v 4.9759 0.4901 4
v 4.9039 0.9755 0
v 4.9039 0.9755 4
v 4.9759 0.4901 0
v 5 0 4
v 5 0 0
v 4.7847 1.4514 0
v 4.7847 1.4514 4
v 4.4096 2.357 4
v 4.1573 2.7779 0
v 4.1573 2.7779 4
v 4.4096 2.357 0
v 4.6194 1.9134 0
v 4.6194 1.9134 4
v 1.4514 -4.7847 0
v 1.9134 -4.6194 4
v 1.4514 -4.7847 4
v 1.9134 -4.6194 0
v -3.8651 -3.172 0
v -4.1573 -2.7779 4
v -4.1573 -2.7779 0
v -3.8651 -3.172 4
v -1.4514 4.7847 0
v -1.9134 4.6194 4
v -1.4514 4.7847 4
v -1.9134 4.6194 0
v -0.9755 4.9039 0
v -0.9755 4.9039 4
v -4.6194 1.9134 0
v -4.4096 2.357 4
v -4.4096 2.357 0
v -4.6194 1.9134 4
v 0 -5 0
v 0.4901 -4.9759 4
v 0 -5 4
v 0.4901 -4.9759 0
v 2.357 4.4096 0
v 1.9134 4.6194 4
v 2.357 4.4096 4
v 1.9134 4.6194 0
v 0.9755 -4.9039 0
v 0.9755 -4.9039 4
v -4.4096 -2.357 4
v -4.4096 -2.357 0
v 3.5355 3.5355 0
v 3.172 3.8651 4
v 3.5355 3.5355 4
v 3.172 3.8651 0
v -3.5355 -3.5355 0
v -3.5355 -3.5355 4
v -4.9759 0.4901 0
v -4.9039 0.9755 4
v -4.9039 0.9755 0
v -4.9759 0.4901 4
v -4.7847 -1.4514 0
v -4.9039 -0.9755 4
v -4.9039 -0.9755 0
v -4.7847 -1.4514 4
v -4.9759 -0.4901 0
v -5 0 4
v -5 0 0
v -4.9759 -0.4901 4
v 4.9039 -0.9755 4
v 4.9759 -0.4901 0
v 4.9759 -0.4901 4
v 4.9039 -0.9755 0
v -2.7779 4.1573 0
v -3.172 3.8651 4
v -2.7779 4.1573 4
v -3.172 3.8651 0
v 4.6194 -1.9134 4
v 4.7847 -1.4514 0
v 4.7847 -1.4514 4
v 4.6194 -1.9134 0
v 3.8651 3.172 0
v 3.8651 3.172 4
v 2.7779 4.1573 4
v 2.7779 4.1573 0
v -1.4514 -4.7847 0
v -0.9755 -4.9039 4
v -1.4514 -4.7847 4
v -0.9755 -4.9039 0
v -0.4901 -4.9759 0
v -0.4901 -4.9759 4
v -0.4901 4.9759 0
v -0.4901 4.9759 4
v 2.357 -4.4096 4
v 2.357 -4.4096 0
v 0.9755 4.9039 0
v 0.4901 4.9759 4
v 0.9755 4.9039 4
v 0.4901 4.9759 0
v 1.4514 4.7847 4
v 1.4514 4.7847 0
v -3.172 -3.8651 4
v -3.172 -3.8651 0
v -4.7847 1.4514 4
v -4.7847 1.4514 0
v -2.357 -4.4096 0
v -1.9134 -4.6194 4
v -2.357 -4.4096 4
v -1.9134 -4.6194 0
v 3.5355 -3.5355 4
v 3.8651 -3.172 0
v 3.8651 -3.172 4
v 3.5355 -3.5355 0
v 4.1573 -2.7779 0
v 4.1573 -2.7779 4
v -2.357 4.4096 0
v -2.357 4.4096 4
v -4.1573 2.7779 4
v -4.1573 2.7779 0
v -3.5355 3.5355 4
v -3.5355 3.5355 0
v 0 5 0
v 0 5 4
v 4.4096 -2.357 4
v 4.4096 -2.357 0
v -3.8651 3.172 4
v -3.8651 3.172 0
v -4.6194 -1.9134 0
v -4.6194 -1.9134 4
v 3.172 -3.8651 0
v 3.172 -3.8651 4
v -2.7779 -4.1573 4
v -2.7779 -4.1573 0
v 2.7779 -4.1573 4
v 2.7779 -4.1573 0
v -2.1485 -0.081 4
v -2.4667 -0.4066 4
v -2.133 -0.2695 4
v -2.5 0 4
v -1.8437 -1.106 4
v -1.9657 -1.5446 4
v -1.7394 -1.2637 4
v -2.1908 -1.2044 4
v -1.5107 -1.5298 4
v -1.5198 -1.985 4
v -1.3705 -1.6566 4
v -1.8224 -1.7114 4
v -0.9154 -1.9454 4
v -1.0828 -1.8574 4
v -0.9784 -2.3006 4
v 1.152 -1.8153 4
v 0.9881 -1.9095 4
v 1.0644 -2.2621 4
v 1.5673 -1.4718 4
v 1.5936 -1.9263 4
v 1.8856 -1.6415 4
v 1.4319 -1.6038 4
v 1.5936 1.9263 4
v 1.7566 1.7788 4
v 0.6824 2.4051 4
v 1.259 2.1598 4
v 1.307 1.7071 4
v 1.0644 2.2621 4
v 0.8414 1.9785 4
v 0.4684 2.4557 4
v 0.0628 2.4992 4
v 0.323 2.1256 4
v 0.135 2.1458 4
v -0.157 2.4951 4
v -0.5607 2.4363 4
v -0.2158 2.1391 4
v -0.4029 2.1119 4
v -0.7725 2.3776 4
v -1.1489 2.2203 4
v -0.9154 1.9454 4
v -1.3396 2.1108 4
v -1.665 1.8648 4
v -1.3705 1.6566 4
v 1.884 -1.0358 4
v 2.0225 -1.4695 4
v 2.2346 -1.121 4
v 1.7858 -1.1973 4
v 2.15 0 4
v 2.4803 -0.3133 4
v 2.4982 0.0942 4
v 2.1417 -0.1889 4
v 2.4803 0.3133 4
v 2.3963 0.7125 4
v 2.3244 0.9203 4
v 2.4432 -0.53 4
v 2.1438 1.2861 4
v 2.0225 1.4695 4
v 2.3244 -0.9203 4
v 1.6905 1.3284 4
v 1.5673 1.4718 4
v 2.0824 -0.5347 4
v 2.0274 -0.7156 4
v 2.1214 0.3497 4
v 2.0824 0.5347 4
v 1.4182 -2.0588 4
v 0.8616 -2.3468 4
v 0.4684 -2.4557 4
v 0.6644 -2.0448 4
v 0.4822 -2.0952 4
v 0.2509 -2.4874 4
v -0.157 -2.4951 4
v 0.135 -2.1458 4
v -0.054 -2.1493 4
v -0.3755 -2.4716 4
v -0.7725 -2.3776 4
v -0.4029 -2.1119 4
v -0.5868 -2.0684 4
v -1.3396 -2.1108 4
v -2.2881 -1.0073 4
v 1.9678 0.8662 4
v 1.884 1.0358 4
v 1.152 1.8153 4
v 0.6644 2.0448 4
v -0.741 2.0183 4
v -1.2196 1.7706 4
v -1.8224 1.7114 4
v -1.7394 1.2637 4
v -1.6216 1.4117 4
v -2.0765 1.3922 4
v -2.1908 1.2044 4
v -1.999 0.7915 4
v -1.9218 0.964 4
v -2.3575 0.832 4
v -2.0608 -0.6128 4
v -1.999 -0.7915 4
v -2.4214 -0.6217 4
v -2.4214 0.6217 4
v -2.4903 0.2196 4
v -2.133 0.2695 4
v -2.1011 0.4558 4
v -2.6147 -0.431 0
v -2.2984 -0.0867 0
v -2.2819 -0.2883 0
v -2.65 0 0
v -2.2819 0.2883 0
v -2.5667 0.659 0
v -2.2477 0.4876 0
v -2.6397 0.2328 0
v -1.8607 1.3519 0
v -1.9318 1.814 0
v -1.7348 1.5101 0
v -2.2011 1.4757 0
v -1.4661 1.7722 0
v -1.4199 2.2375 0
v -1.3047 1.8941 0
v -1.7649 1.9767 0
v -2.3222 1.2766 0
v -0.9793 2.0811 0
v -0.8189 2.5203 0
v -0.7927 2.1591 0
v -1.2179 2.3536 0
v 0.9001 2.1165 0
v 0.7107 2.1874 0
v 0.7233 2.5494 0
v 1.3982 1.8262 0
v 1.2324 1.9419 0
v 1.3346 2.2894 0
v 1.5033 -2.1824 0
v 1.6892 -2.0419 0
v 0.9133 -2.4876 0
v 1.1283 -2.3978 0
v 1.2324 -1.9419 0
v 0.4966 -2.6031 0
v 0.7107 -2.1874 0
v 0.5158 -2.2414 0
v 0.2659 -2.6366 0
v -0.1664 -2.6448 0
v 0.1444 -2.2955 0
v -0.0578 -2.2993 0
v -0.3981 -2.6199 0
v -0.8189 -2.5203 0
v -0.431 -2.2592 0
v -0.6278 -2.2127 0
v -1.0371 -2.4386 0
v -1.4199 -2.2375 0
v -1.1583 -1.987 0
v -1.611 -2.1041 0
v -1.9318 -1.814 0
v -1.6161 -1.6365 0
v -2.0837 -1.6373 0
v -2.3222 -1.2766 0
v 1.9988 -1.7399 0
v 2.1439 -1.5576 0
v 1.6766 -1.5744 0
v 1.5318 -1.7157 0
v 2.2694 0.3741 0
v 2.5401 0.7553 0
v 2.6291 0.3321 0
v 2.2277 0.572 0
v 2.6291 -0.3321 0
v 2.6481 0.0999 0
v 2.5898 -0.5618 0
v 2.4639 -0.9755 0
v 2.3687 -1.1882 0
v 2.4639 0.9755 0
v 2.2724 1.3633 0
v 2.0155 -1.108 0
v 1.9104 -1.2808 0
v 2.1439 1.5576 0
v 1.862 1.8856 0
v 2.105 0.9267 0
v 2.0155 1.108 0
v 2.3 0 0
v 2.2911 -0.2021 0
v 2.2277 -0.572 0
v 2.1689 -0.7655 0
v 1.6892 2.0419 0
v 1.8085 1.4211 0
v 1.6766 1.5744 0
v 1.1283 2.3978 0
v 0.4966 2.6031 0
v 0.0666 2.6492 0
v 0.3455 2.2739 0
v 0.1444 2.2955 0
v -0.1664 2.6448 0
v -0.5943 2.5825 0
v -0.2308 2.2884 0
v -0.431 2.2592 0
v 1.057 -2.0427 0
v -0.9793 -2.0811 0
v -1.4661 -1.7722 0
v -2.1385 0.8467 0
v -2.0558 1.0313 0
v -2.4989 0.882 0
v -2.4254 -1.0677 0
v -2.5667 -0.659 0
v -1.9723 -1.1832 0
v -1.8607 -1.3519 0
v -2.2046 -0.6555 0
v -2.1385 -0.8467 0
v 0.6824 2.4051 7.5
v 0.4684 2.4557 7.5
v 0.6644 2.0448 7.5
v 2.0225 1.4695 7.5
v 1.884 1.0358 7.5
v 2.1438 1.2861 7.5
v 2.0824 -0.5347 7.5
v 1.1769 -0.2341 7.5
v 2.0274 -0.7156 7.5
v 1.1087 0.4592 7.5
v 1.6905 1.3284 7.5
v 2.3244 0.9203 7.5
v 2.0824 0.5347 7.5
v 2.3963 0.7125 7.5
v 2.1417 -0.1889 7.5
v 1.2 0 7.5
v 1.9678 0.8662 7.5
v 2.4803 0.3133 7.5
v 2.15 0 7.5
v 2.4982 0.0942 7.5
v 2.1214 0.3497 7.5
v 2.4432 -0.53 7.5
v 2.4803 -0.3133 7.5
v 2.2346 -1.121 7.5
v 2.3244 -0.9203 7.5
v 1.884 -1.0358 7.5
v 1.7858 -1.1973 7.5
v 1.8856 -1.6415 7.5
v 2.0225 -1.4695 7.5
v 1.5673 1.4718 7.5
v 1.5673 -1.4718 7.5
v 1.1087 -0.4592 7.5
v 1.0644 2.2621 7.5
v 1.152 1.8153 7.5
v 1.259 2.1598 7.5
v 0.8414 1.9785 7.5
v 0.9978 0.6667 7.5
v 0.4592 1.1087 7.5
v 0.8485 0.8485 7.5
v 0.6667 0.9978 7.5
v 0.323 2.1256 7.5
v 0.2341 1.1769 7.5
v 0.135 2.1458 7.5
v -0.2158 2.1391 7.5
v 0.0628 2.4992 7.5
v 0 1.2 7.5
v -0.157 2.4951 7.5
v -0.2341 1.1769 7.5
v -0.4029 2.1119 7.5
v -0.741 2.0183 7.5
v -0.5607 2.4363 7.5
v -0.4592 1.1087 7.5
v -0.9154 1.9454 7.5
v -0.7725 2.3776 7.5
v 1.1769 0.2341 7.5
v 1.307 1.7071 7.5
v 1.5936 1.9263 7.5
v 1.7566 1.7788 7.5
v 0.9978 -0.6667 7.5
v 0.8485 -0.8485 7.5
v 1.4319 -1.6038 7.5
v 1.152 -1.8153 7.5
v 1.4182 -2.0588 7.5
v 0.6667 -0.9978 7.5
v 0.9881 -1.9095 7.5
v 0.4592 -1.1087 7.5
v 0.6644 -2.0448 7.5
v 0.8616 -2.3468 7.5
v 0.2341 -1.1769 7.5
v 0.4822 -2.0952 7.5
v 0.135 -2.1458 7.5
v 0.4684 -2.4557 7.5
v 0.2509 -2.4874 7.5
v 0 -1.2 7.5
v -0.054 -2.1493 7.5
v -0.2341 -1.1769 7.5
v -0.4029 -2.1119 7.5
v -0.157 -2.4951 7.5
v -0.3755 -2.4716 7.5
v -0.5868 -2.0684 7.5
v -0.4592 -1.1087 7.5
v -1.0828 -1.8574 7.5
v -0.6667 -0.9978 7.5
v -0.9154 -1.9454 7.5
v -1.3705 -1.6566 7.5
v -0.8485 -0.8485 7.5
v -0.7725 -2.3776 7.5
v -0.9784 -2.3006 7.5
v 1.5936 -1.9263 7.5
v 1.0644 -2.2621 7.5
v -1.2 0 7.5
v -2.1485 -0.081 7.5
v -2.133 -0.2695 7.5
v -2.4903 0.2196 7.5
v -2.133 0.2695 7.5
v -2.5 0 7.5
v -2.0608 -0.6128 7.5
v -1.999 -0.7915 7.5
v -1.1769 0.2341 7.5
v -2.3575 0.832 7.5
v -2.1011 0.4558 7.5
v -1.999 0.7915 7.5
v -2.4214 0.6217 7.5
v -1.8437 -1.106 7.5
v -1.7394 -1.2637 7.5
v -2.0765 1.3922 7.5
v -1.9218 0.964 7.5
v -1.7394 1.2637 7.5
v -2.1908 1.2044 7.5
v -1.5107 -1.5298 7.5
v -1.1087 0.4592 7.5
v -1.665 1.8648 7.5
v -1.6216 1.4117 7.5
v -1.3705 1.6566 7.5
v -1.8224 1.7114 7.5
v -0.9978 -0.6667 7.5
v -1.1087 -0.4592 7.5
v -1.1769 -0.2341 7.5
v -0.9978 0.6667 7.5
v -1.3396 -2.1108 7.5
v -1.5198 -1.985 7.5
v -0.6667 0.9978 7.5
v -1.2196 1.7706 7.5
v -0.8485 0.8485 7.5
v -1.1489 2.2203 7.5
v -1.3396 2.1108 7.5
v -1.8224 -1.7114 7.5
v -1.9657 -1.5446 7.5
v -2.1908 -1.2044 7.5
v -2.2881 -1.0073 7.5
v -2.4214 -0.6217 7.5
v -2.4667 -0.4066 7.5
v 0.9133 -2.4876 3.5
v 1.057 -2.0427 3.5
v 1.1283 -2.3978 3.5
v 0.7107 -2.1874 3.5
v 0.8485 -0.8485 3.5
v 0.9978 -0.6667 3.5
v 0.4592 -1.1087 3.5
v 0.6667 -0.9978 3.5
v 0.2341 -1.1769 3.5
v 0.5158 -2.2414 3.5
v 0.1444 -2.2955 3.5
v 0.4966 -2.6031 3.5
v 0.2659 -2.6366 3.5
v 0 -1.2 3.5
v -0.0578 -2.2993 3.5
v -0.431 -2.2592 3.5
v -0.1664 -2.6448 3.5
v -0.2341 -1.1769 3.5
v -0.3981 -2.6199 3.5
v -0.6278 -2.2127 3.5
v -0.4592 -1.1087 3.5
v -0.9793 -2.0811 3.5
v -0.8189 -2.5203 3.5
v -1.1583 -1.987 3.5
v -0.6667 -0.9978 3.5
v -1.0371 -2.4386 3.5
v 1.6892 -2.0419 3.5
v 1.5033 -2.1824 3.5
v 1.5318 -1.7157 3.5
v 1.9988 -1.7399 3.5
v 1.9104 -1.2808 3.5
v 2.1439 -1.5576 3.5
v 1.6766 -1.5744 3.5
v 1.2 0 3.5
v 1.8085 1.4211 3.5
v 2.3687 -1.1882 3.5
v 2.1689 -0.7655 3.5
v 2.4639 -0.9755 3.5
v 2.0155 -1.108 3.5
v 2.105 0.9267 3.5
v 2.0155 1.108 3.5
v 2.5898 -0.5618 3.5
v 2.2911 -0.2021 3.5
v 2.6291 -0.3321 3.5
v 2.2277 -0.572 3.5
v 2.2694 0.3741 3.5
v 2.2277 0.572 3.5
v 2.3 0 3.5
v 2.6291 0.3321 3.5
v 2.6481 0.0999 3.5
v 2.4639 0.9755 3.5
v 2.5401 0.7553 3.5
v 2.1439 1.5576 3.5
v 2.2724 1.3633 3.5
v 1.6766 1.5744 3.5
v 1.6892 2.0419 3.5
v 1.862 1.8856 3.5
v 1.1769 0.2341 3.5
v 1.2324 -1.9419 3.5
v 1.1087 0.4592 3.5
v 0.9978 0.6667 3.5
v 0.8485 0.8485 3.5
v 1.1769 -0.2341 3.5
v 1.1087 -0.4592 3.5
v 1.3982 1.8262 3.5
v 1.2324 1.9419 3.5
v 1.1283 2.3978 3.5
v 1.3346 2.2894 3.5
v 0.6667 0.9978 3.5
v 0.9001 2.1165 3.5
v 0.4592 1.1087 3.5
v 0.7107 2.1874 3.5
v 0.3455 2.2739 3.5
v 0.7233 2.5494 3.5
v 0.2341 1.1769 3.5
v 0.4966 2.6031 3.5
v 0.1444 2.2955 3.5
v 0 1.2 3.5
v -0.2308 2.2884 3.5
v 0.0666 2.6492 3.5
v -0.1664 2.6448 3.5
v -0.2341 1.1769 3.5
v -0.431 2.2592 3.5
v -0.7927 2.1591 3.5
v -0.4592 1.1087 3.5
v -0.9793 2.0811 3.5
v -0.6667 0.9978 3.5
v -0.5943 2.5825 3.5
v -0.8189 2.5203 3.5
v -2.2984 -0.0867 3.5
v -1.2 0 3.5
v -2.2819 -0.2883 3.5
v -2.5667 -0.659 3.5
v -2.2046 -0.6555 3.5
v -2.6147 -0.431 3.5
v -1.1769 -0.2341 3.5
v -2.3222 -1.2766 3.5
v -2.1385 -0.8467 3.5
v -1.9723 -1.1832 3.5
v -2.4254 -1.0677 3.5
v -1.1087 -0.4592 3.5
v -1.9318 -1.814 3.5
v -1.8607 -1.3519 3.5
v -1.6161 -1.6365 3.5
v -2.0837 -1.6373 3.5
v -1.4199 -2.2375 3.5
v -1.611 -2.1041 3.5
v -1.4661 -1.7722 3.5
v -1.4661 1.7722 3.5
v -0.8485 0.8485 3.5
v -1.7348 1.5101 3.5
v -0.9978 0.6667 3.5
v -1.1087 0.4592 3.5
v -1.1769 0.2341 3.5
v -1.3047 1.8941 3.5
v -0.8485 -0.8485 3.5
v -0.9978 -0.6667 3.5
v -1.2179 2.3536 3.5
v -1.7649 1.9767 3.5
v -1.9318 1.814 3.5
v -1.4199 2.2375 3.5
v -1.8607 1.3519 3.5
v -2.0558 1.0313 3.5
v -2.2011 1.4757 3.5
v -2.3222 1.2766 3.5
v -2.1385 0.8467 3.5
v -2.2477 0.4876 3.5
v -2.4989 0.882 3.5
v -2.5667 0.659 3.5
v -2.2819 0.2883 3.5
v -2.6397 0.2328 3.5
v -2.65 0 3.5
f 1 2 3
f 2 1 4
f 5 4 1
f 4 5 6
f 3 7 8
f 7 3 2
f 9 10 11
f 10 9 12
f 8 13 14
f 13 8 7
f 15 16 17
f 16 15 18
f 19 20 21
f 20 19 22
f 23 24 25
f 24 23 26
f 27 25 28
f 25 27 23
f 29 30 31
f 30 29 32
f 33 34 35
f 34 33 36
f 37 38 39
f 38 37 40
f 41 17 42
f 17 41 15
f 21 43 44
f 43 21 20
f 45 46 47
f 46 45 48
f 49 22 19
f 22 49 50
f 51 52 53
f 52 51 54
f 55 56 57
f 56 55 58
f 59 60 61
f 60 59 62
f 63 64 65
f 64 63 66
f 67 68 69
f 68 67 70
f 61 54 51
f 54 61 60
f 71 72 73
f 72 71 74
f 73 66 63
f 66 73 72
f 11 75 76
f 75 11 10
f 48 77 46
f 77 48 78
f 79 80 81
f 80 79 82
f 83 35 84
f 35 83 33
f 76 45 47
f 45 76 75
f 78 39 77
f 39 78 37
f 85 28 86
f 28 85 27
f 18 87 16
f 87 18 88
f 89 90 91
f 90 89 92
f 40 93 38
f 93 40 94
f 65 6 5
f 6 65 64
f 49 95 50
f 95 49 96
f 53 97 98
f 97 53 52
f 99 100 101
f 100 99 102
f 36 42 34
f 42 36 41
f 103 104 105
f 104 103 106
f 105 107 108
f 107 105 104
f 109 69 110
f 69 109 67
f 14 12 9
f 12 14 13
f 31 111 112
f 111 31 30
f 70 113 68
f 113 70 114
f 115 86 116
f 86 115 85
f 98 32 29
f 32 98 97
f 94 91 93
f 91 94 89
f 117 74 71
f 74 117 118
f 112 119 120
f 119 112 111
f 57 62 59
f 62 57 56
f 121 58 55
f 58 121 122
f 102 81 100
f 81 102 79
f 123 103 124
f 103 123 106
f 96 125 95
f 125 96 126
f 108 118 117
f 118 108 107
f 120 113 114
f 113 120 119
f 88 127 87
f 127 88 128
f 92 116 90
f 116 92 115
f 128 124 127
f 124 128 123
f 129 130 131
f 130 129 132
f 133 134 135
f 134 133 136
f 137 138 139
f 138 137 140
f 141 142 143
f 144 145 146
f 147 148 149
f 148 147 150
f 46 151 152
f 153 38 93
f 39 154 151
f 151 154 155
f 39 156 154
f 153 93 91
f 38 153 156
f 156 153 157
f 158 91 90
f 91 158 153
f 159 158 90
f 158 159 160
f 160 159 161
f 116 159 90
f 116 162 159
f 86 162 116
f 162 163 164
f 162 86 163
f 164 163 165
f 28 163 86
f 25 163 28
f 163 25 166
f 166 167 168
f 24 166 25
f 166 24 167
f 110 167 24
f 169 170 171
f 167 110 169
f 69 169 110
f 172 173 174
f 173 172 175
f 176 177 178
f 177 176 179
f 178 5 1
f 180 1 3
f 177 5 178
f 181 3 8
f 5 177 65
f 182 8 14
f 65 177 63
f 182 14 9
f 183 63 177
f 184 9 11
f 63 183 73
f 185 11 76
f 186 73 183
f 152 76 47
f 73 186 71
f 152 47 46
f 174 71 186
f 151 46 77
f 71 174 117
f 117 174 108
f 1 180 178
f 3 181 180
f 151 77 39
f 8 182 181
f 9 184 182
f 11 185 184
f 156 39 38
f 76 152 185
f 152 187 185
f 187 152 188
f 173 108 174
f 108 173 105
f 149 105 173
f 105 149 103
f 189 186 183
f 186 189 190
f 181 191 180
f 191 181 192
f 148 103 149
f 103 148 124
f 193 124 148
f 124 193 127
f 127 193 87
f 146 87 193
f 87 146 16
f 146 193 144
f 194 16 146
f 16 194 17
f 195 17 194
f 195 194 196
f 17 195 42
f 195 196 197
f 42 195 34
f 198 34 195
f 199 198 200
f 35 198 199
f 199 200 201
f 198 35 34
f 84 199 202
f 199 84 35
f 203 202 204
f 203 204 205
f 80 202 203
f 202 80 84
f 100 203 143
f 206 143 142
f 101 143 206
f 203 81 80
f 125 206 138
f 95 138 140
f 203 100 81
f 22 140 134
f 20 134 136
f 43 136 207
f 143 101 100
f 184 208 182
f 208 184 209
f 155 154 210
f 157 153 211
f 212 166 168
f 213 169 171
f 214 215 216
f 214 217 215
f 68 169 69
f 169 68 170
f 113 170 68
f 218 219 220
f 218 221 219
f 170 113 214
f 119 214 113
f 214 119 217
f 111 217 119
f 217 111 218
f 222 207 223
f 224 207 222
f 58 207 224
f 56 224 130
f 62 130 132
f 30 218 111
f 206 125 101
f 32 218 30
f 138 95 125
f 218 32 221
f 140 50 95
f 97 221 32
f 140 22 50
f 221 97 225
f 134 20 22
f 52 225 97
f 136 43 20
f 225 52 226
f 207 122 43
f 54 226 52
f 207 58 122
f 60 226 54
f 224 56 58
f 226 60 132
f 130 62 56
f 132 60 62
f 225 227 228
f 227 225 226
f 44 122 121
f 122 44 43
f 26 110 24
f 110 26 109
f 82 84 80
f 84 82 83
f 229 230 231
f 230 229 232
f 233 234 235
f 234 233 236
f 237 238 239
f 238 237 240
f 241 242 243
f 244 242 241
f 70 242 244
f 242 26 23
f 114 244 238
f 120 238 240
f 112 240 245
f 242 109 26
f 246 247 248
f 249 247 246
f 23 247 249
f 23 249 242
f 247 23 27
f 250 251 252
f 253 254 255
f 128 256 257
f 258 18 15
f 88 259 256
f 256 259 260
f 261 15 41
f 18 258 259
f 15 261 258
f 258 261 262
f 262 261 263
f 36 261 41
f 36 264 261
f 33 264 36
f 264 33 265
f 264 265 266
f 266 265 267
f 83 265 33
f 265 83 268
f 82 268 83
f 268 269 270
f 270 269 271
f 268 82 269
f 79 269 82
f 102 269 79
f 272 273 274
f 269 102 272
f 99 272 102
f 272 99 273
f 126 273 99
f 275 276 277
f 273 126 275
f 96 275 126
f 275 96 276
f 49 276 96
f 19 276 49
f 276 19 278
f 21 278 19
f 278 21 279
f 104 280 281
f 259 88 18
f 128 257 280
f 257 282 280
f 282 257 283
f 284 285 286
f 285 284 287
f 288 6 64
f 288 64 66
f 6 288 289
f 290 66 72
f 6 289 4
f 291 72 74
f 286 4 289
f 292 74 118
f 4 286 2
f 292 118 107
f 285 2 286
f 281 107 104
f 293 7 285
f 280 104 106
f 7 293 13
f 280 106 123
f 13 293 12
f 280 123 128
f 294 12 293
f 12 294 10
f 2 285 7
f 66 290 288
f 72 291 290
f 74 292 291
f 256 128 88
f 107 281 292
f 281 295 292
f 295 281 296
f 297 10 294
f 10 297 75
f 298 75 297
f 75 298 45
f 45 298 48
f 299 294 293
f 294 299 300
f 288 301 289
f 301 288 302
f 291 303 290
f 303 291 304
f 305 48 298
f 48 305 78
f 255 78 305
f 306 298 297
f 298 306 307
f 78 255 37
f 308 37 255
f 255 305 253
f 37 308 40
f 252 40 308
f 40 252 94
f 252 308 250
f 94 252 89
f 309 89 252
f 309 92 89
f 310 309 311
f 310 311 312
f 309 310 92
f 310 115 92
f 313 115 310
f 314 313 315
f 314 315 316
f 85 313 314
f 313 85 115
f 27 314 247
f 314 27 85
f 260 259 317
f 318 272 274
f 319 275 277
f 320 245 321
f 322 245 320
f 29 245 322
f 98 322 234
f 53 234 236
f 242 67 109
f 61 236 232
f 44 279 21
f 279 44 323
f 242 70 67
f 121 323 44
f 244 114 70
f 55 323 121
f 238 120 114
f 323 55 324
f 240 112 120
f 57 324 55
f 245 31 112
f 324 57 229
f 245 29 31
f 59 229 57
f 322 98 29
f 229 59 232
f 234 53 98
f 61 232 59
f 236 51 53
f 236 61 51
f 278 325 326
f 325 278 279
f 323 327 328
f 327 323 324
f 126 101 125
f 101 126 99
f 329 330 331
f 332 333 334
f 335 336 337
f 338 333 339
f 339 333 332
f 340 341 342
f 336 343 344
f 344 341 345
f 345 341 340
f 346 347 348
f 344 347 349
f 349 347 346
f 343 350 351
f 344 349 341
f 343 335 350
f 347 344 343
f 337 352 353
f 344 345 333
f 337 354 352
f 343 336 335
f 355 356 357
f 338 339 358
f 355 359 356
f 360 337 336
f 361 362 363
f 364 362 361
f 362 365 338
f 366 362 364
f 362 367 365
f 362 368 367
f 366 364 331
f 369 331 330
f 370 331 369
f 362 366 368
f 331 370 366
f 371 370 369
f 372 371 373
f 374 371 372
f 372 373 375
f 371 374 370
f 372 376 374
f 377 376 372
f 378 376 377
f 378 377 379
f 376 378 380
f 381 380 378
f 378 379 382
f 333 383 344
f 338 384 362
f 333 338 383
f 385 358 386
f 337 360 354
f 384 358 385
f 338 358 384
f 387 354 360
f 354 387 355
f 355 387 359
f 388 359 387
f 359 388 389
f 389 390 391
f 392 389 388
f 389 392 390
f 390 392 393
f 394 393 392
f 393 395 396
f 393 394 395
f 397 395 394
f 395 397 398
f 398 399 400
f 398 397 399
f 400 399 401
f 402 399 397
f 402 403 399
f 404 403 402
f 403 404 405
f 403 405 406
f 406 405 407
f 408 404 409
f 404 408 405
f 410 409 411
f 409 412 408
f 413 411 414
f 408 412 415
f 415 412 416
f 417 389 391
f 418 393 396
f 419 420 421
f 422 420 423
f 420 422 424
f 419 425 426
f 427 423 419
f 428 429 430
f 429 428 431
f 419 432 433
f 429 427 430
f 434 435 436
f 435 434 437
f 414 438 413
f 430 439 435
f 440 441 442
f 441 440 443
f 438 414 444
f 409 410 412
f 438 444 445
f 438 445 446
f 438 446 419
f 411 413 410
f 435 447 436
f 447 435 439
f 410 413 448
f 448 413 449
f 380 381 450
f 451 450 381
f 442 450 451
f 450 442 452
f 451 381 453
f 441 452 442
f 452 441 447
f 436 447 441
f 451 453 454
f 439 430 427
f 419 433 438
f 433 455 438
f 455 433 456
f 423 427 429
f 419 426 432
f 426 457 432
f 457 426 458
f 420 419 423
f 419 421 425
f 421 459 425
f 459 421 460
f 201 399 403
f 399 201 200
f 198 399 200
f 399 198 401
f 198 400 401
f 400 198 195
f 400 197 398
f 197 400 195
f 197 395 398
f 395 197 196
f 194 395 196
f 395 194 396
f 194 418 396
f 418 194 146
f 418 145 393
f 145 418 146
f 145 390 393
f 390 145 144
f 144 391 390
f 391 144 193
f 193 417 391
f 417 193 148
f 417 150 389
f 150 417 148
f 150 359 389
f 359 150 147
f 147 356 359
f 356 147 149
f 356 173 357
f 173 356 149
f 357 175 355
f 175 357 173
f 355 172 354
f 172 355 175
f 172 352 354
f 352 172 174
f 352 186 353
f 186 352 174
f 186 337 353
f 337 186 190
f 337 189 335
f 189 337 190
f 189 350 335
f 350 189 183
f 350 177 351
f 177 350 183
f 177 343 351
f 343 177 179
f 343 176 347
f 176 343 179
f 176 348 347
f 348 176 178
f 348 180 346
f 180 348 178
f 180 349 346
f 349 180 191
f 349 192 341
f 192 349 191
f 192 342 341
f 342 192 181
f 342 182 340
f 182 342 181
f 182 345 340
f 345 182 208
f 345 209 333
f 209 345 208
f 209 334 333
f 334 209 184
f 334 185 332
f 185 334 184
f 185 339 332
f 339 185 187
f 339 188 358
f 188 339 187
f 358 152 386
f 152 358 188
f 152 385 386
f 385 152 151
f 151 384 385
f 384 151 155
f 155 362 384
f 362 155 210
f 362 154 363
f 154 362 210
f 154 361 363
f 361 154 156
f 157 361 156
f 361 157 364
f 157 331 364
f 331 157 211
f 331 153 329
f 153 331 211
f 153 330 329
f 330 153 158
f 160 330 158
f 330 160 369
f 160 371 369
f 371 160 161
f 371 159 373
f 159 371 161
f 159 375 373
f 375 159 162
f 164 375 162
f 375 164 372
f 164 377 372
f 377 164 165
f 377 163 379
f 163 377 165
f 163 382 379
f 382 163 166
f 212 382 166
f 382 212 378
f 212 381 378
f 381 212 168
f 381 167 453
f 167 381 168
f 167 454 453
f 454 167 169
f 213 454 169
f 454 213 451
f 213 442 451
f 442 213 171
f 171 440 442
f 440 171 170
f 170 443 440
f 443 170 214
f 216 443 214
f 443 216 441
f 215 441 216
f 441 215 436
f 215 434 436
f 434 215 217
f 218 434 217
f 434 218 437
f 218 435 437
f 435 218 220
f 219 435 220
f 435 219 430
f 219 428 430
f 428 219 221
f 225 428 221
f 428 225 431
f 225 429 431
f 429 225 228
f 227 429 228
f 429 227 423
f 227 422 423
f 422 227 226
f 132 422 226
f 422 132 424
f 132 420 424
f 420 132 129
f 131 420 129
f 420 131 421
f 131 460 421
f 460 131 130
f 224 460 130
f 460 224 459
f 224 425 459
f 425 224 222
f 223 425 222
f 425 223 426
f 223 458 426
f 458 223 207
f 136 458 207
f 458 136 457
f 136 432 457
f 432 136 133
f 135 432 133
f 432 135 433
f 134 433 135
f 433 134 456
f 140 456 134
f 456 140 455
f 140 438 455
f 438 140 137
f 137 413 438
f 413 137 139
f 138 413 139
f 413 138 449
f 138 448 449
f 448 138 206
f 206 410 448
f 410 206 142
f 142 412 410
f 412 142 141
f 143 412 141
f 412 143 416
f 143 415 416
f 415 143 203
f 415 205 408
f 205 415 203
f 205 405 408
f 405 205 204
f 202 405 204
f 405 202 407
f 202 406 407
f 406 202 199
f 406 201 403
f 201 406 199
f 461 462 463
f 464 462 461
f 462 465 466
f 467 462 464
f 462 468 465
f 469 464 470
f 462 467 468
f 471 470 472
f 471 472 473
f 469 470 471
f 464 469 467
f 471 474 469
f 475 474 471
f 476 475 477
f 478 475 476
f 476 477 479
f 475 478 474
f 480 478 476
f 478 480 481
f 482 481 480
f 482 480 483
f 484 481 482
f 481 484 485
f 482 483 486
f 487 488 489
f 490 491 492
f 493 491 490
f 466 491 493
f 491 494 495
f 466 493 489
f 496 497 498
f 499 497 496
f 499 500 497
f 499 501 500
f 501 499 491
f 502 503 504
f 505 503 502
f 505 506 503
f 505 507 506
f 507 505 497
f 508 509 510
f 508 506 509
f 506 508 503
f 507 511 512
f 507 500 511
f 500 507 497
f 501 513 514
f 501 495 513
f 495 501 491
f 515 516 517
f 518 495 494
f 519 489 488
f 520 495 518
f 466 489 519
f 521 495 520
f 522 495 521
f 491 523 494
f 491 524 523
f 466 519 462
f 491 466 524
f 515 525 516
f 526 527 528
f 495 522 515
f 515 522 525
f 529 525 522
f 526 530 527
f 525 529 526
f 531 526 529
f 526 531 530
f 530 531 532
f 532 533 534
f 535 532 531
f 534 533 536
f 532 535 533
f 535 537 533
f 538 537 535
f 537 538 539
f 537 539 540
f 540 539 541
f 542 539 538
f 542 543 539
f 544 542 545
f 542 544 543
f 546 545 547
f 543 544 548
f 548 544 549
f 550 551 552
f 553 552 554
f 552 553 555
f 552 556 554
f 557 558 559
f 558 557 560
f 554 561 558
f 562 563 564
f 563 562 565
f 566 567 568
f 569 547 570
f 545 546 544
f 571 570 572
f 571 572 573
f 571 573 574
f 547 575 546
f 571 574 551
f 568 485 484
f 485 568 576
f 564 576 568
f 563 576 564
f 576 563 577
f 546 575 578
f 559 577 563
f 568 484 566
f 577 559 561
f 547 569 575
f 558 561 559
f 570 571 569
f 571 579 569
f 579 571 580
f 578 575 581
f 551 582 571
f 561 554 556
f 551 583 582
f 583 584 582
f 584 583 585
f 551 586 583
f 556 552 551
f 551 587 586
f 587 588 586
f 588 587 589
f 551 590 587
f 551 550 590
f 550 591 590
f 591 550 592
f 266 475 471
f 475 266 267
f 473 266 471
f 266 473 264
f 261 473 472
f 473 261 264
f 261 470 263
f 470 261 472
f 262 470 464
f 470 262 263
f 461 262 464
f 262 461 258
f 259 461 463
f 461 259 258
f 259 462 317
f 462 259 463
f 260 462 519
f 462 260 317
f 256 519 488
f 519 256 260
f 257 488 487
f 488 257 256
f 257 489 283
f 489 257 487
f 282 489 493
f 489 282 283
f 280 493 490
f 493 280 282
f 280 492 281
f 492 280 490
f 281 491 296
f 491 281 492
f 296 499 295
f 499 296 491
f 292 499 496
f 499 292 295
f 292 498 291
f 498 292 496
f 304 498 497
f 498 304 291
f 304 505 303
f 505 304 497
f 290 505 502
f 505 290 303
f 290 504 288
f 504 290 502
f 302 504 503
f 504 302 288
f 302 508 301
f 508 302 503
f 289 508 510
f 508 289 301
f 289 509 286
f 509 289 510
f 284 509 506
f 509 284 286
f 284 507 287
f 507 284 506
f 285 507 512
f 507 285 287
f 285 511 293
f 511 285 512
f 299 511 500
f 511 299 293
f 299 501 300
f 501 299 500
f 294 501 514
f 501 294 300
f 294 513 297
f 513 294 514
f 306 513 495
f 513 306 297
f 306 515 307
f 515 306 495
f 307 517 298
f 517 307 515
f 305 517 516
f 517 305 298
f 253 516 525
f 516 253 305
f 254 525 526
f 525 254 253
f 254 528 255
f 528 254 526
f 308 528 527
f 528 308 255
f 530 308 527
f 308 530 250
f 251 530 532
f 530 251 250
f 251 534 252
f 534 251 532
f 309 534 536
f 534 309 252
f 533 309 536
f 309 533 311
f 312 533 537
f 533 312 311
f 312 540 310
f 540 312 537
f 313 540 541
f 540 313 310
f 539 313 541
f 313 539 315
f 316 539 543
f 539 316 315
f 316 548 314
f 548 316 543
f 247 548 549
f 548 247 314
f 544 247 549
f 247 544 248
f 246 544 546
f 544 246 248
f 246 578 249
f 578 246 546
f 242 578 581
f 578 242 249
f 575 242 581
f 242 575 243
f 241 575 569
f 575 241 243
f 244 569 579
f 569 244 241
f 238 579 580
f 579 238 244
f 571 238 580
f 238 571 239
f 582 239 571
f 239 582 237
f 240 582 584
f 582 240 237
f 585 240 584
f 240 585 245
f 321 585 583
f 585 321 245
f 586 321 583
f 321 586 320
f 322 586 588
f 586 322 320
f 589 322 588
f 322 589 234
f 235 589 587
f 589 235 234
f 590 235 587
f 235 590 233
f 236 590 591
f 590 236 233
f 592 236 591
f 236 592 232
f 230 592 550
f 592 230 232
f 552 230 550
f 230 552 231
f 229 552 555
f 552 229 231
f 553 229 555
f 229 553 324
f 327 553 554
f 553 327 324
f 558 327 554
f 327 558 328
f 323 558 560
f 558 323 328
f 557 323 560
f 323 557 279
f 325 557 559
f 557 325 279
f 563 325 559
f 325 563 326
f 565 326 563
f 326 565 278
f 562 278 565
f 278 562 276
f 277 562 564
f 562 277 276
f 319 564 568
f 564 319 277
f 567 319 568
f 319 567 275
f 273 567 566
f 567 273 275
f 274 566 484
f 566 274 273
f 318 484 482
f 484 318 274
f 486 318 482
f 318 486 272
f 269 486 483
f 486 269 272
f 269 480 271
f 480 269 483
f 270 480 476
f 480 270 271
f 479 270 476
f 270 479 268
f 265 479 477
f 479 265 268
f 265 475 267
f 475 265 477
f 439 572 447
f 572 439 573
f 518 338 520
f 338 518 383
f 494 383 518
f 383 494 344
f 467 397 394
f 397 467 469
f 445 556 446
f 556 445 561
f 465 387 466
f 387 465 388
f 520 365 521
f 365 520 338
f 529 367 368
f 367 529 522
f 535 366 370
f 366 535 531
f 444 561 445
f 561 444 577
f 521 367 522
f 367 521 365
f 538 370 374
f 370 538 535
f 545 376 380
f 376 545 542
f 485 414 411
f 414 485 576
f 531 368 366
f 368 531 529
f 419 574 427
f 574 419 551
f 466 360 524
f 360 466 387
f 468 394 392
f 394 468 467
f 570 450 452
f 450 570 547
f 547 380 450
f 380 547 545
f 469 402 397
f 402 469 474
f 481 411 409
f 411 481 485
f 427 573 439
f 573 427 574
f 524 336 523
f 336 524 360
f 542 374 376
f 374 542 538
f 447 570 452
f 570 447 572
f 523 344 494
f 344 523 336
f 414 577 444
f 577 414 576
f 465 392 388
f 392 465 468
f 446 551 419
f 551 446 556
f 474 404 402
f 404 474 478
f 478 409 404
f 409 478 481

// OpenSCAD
// The hip spacer, alone. Z axis, servo side at Z = 0, leg side up.
//   servo side: a female splined socket, like the gear cup in the leg, that the servo's splined shaft fits into
//   leg side:   a male splined stub, like the servo's shaft, that fits into the white gear in the leg
//   an M2 screw goes through the whole spacer (clearance hole) and ties the servo, spacer and gear together
// From your servo specs: 25T spline, 5.0 mm shaft, M2 screw. Best guesses, not measured: the tooth depth and shape,
// how far the shaft reaches, the 10 mm body, and the socket clearance.
shaft_d = 5.0;      // outside diameter of the servo's splined shaft (tooth tips), from the servo specs you gave
tooth_n = 25;       // tooth count (25T), from the servo specs you gave
tooth_h = 0.35;     // tooth depth
reach = 3.5;        // how far the shaft sticks out of the servo, and how far the male stub reaches into the leg gear
fit = 0.15;         // radial clearance of the female socket over the shaft

// spline outline: n trapezoid teeth between the root radius and the tip radius
function spline_pts(r_tip, h, n) = [for (i = [0 : n - 1], a = [
        [0, r_tip - h], [0.15, r_tip], [0.5, r_tip], [0.65, r_tip - h]])
    let (ang = (i + a[0]) * 360 / n) [cos(ang) * a[1], sin(ang) * a[1]]];

module spline_2d(r_tip) { polygon(spline_pts(r_tip, tooth_h, tooth_n)); }

module spacer_part(t = 4, od = 10, screw_d = 2.4) {
    color("#e8641b") difference() {
        union() {
            cylinder(d = od, h = t, $fn = 64);                                          // body between the servo and the leg
            translate([0, 0, t - 0.01]) linear_extrude(reach + 0.01) spline_2d(shaft_d / 2);     // male stub
        }
        translate([0, 0, -0.01]) linear_extrude(reach + 0.01) spline_2d(shaft_d / 2 + fit);       // female socket
        translate([0, 0, -1]) cylinder(d = screw_d, h = t + reach + 2, $fn = 32);                // M2 screw
    }
}

// section = true: cut the part in half to show the socket, the stub and the screw hole
section = false;
if (section) intersection() { spacer_part(); translate([-10, 0, -1]) cube([20, 10, 20]); }
else spacer_part();
